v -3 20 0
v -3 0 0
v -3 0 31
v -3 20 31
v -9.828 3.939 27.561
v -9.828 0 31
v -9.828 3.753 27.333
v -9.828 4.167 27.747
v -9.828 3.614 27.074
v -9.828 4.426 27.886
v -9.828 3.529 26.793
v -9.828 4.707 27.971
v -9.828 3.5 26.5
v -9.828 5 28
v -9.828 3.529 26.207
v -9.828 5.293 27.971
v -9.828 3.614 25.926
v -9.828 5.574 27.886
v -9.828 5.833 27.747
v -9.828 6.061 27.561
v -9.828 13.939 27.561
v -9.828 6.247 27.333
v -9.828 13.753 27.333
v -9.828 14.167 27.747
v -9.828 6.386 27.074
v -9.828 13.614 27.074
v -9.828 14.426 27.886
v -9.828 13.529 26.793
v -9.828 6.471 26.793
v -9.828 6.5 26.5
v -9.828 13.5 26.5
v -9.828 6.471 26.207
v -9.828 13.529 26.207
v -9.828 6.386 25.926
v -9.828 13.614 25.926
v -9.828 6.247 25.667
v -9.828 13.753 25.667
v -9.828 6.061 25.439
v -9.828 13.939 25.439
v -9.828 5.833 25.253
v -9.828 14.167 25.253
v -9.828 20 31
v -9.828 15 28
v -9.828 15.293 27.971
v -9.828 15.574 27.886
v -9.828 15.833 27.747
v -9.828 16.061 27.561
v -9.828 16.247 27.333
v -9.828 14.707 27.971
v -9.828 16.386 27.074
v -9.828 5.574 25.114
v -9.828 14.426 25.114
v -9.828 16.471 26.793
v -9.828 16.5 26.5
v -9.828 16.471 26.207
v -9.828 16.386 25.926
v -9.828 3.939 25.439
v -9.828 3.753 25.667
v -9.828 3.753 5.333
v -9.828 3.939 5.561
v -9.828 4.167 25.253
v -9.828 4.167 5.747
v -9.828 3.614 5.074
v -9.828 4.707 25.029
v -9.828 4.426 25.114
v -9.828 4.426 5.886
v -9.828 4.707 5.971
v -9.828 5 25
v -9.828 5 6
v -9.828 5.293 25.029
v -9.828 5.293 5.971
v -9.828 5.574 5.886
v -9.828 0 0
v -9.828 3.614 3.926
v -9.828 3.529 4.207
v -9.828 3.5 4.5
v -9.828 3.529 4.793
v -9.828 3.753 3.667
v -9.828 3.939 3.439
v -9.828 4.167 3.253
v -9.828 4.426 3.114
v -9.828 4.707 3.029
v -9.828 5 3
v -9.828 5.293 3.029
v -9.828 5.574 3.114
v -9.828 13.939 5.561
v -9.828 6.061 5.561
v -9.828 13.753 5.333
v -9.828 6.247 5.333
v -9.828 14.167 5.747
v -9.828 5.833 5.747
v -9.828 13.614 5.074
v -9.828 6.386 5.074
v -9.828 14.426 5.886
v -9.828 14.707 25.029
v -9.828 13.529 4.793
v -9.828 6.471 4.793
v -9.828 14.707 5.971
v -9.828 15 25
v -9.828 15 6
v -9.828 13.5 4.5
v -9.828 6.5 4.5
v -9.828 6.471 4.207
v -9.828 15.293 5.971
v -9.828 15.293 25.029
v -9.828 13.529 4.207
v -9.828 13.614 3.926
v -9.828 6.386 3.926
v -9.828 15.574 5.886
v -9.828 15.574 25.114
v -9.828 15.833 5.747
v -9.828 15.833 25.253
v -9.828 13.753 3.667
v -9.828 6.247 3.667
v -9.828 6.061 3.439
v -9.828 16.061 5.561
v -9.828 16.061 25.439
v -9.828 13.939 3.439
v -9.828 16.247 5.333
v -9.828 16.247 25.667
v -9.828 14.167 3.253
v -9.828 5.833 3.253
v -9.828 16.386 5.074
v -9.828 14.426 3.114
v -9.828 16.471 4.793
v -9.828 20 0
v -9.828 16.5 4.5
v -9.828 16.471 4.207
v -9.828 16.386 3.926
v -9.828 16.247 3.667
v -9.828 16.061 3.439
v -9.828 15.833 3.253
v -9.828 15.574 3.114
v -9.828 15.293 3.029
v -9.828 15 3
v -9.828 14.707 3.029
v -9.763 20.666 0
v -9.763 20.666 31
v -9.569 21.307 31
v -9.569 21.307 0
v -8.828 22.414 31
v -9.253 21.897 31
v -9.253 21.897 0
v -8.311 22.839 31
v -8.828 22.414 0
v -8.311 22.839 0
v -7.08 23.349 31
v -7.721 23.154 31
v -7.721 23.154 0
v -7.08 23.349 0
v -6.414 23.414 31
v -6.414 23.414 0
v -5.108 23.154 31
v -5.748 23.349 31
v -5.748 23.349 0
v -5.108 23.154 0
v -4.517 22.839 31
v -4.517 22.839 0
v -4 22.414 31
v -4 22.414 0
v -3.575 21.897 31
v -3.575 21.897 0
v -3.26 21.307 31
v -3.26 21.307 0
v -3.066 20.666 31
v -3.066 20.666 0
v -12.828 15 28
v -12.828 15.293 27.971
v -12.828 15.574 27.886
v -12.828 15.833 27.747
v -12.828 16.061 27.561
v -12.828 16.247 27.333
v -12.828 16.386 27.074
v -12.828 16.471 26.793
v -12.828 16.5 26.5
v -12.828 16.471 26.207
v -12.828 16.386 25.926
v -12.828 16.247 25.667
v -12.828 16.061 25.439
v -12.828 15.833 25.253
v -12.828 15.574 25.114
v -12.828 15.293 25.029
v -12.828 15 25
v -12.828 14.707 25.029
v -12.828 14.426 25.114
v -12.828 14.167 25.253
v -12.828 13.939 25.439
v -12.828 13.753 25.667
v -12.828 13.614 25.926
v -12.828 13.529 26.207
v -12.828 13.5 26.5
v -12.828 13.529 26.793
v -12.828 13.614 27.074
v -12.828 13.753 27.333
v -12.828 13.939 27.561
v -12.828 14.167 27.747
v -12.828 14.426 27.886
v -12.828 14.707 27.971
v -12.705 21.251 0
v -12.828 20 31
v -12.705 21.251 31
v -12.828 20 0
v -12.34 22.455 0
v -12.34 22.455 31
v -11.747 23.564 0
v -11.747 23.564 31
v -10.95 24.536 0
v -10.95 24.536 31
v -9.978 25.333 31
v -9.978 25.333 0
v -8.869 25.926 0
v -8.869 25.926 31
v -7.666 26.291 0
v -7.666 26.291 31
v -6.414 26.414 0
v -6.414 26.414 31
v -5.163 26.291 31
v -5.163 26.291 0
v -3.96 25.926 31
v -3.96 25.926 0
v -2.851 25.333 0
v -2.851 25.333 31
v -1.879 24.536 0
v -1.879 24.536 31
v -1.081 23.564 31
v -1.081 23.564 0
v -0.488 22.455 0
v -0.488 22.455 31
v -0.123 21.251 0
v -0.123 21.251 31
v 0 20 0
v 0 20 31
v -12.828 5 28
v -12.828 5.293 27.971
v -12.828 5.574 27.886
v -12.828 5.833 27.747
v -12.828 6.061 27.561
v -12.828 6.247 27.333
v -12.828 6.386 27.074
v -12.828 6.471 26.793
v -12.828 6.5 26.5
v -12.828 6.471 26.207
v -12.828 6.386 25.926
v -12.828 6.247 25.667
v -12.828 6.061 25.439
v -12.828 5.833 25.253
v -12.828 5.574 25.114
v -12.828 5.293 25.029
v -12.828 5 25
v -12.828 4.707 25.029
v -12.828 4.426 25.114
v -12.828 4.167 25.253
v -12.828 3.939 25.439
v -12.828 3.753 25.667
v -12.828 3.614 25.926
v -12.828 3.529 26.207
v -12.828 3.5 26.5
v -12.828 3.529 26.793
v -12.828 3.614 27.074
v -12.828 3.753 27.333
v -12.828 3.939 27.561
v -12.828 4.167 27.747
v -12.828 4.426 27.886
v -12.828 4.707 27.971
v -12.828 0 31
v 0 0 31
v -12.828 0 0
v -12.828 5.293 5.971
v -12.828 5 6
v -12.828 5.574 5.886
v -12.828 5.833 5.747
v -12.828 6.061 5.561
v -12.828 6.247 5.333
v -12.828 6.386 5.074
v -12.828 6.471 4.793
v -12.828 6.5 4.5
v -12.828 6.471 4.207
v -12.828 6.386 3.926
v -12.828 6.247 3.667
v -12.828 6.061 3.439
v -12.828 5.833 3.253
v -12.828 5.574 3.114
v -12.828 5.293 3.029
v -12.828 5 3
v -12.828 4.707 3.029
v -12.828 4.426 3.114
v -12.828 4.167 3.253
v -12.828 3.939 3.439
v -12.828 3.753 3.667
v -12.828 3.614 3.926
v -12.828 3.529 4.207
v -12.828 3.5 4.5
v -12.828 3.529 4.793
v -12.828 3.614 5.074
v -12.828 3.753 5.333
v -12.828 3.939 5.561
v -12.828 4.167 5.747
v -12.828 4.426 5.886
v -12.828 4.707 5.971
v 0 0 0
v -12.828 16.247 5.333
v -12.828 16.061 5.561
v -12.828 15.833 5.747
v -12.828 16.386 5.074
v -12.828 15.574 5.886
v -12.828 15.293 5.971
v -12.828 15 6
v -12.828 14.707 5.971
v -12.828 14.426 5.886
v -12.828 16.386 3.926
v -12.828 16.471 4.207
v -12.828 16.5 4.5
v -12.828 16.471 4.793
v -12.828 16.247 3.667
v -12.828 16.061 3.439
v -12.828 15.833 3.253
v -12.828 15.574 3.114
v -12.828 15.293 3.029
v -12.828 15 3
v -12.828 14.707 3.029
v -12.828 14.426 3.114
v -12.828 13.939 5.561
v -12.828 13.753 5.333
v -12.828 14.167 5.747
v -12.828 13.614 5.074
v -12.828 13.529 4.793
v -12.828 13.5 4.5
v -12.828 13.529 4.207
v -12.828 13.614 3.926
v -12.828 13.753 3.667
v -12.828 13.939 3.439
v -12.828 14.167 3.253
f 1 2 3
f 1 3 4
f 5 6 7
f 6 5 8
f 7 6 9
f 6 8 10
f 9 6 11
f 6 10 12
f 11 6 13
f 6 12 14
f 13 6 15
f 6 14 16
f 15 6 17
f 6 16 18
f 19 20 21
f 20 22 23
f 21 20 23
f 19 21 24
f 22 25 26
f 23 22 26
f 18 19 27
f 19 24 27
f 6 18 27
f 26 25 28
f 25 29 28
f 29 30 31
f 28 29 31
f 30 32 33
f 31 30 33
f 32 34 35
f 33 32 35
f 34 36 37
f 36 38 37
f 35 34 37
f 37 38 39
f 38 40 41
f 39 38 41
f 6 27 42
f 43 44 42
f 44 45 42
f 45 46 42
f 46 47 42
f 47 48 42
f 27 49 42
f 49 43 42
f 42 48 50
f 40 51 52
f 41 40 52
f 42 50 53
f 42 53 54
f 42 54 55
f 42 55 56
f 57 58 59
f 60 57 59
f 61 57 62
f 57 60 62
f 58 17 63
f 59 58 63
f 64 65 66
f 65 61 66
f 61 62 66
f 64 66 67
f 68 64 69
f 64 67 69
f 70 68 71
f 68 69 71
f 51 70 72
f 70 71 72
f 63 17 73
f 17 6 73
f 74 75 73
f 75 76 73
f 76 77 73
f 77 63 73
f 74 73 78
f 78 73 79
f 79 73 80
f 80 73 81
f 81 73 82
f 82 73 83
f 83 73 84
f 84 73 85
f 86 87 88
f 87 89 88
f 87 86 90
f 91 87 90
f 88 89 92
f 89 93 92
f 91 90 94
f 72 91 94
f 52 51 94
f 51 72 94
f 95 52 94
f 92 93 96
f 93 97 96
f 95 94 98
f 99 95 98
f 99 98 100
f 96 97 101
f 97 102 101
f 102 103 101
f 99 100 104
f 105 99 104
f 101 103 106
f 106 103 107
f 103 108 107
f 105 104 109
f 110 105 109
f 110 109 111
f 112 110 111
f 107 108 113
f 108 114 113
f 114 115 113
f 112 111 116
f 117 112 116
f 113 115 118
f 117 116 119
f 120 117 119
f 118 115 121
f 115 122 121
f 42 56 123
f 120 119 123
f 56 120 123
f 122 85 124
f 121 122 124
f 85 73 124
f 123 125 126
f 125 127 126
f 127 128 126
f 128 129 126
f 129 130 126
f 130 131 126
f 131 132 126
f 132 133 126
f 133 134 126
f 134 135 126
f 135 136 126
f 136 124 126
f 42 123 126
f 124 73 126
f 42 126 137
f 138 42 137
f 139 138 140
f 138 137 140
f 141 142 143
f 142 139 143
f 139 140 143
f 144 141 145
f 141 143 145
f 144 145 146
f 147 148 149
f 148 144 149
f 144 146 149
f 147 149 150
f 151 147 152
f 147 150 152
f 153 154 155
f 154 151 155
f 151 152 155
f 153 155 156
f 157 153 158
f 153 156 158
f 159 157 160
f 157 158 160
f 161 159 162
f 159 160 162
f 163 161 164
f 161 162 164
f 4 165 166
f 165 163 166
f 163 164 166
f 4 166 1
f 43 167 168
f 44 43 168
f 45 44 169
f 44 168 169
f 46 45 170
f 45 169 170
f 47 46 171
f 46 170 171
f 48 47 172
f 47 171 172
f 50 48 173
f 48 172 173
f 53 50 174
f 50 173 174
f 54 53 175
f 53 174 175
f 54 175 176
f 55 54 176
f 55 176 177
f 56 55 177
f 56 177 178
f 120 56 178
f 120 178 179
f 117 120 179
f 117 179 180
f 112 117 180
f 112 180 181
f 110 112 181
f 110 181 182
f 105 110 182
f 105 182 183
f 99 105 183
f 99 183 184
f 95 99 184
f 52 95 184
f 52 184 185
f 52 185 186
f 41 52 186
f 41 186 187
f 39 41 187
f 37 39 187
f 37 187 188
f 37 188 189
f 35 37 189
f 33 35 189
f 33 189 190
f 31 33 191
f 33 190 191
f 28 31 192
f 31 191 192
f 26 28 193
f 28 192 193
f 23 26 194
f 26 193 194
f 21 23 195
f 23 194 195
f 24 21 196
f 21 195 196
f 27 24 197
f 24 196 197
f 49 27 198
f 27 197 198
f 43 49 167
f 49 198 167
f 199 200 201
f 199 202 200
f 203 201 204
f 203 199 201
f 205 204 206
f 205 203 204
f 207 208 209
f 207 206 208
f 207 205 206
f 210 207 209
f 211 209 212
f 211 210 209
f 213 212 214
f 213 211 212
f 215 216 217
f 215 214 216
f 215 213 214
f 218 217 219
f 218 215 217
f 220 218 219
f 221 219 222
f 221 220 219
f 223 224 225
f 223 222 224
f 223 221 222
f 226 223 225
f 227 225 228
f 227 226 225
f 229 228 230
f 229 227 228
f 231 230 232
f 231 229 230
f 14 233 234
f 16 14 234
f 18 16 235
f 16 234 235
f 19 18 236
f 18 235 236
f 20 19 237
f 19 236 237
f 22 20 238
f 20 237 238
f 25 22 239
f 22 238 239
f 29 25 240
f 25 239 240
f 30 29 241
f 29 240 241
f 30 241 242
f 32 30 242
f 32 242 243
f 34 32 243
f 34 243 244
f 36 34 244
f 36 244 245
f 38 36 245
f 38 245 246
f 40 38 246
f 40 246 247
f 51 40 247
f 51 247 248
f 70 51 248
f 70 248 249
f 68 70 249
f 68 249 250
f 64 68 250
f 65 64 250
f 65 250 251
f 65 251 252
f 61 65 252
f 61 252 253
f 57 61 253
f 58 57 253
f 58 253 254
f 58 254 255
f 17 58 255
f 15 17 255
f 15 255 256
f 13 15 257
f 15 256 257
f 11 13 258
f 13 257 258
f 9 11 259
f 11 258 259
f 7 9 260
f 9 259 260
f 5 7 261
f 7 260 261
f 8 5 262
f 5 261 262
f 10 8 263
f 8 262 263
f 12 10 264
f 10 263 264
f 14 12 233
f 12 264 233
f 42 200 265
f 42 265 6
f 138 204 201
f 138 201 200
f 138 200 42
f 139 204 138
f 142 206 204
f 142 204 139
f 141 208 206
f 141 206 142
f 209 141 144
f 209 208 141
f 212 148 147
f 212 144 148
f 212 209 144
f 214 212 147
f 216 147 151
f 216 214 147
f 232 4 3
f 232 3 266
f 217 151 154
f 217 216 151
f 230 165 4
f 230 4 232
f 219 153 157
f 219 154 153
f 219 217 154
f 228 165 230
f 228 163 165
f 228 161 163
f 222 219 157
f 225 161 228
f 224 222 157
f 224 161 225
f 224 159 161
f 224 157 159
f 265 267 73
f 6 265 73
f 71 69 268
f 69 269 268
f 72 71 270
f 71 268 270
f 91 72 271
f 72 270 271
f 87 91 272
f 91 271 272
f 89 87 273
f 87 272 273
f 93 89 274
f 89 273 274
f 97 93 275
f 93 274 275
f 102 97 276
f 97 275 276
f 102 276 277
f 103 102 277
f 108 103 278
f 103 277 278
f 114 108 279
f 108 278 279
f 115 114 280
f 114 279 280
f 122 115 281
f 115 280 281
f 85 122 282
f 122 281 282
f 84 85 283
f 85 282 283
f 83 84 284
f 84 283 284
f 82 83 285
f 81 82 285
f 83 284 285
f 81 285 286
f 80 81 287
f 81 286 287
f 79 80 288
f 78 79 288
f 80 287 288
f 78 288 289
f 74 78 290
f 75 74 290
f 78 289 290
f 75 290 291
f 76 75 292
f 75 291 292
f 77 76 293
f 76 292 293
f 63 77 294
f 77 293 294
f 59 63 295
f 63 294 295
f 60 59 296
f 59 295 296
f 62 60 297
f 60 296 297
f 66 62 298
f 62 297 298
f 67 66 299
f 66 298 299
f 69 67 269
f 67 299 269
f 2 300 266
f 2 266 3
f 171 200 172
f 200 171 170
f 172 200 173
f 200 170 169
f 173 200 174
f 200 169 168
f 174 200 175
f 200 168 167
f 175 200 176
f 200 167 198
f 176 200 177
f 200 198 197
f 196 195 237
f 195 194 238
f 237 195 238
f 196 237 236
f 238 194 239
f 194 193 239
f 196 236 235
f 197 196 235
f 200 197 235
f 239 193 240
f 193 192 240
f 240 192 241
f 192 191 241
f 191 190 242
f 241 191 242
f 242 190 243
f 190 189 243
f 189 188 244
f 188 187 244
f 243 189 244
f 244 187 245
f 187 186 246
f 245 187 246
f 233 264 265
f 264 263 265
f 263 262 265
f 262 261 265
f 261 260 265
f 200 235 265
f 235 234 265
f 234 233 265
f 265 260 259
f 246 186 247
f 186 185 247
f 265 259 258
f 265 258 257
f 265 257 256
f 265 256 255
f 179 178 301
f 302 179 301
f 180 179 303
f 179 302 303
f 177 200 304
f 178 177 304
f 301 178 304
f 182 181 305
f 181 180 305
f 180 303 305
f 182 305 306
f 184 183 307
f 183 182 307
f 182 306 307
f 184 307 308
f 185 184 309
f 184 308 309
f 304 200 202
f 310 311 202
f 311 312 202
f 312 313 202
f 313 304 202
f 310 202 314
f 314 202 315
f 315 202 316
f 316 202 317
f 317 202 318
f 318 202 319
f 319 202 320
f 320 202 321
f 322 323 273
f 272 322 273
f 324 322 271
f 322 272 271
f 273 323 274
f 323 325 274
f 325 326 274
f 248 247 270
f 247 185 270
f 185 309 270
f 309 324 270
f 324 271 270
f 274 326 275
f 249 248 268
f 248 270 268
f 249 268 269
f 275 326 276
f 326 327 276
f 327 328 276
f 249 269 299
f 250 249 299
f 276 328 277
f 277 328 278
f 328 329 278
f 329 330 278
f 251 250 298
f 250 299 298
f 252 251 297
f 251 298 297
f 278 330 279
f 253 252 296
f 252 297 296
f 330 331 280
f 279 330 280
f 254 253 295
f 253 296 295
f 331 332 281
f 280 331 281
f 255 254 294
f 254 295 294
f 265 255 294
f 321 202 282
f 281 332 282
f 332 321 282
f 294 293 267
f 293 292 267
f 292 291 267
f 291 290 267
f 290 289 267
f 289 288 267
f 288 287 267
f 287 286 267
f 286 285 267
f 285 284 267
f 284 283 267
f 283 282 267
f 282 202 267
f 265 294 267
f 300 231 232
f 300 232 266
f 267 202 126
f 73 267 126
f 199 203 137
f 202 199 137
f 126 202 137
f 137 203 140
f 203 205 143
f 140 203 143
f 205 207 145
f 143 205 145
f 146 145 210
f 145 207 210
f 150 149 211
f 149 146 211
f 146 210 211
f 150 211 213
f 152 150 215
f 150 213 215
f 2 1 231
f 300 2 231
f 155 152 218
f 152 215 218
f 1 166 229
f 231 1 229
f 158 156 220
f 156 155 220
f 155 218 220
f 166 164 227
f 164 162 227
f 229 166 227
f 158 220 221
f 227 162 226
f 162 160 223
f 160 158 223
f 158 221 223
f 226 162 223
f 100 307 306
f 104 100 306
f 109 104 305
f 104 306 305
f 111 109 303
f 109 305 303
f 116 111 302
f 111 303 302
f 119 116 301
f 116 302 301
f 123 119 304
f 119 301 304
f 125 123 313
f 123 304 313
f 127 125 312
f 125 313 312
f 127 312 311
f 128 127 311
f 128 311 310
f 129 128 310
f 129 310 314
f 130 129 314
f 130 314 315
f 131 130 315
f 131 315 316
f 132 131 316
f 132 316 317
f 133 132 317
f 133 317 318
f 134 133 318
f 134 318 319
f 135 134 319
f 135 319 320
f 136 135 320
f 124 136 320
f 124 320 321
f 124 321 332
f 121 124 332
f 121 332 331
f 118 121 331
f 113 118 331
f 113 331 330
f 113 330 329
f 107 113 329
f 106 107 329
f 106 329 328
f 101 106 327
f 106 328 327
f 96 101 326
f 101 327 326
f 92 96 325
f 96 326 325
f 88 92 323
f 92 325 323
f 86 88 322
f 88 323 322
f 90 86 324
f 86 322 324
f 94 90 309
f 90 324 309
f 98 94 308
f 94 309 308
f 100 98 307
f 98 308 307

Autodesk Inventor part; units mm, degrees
ref_plane "YZ Plane" through (0, 0, 0) normal (1, 0, 0) x (0, 1, 0)
ref_plane "XZ Plane" through (0, 0, 0) normal (0, 1, 0) x (-1, 0, 0)
sketch "Sketch1" plane through (0, 0, 0) normal (0, 0, 1) x (1, 0, 0)
  line L0 (0, 20) -> (0, 0) projected
  line L1 (0, 20) -> (-3, 20) projected
  line L2 (-3, 0) -> (-3, 20) projected
  line L3 (0, 0) -> (-3, 0) projected
  arc A0 (-3, 20) -> (-9.8284, 20) centre (-6.4142, 20) ccw
  circle A1 centre (-6.4142, 20) radius 6.4142
  line L4 (-9.8284, 20) -> (-12.8284, 20)
  line L5 (-12.8284, 20) -> (-12.8284, 0)
  line L6 (-12.8284, 0) -> (-9.8284, 0)
  line L7 (-9.8284, 0) -> (-9.8284, 20)
  point P0 (-3, 14.57)
ref_plane "Work Plane1" through (-3, 0, 31) normal (0, 0, -1) x (0, 1, 0)
extrude "Extrusion1" add sketch "Sketch1" along normal up to surface (31 mm away) contours A1 L2 L1 | L1 A0 L4 A1 | L0 L3 L2 A1 | L4 L7 A1 | A1 L7 L6 L5
sketch "Sketch2" plane through (-12.8284, 0, 0) normal (-1, 0, 0) x (0, 0, 1)
  line L0 (0, 0) -> (31, 0) projected
  line L1 (15.5, 0) -> (15.5, 20)
  line L2 (0, 20) -> (31, 20) projected
  line L3 (15.5, 10) -> (4.5, 10)
  line L4 (15.5, 10) -> (26.5, 10)
  line L5 (26.5, 10) -> (26.5, 5)
  line L6 (4.5, 10) -> (4.5, 15)
  circle A0 centre (26.5, 5) radius 1.5
  circle A1 centre (4.5, 15) radius 1.5
  line L7 (26.5, 5) -> (4.5, 5)
  line L8 (4.5, 5) -> (4.5, 15)
  line L9 (4.5, 15) -> (26.5, 15)
  line L10 (26.5, 15) -> (26.5, 5)
  circle A2 centre (4.5, 5) radius 1.5
  circle A3 centre (26.5, 15) radius 1.5
  dimension "d2" = 11
  dimension "d3" = 11
  dimension "d4" = 5
  dimension "d5" = 5
  dimension "d6" = 3
  dimension "d7" = 3
  dimension "d8" = 3
  dimension "d9" = 3
extrude "Extrusion2" cut sketch "Sketch2" against normal up to surface (3 mm away) contours L7 L5 A0 | A0 L5 L7 | A2 L8 L7 | L7 L8 A2 | L9 L6 A1 | A1 L6 L9 | A3 L10 L9 | L9 L10 A3
properties part number "back_helmet_holder" material "Stainless Steel"
